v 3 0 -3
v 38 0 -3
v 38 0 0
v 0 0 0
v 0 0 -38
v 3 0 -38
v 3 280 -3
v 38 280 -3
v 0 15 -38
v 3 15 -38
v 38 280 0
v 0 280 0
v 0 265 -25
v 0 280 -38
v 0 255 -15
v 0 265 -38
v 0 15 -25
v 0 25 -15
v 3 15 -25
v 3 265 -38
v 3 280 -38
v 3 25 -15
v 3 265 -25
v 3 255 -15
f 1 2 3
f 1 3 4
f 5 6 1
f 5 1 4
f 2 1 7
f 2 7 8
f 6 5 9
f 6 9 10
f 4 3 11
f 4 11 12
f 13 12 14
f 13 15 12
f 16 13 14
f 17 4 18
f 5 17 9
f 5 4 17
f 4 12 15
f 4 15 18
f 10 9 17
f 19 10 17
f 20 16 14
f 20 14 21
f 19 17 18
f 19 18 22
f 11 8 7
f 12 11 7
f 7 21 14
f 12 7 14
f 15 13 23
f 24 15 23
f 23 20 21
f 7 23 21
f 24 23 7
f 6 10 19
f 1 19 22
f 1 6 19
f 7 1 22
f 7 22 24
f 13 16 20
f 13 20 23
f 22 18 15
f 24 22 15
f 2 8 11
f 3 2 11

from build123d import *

# Parameters (mm, degrees)
SALIENTE_EXTRUIR1_DEPTH = 280
CROQUIS2_W              = 23
CROQUIS2_H              = 250
CORTAR_EXTRUIR1_DEPTH   = 3
CHAFL_N1_SIZE           = 10


with BuildPart() as part:
    # Croquis1 → Saliente-Extruir1 (new body)
    with BuildSketch(Plane(origin=(0, 0, 0), x_dir=(1, 0, 0), z_dir=(0, 1, 0))):
        Polygon((0, 0), (0, 38), (3, 38), (3, 3), (38, 3), (38, 0), align=None)
    extrude(amount=SALIENTE_EXTRUIR1_DEPTH)

    # Croquis2 → Cortar-Extruir1 (cut)
    with BuildSketch(Plane.ZY):
        with Locations((-26.5, 140)):
            Rectangle(CROQUIS2_W, CROQUIS2_H)
    extrude(amount=-CORTAR_EXTRUIR1_DEPTH, mode=Mode.SUBTRACT)

    # Chaflán1
    chafl_n1_edges = [part.edges().sort_by_distance(p)[0] for p in [
        (1.5, 265, -15),
        (1.5, 15, -15),
    ]]
    chamfer(chafl_n1_edges, length=CHAFL_N1_SIZE)


solid = part.part
